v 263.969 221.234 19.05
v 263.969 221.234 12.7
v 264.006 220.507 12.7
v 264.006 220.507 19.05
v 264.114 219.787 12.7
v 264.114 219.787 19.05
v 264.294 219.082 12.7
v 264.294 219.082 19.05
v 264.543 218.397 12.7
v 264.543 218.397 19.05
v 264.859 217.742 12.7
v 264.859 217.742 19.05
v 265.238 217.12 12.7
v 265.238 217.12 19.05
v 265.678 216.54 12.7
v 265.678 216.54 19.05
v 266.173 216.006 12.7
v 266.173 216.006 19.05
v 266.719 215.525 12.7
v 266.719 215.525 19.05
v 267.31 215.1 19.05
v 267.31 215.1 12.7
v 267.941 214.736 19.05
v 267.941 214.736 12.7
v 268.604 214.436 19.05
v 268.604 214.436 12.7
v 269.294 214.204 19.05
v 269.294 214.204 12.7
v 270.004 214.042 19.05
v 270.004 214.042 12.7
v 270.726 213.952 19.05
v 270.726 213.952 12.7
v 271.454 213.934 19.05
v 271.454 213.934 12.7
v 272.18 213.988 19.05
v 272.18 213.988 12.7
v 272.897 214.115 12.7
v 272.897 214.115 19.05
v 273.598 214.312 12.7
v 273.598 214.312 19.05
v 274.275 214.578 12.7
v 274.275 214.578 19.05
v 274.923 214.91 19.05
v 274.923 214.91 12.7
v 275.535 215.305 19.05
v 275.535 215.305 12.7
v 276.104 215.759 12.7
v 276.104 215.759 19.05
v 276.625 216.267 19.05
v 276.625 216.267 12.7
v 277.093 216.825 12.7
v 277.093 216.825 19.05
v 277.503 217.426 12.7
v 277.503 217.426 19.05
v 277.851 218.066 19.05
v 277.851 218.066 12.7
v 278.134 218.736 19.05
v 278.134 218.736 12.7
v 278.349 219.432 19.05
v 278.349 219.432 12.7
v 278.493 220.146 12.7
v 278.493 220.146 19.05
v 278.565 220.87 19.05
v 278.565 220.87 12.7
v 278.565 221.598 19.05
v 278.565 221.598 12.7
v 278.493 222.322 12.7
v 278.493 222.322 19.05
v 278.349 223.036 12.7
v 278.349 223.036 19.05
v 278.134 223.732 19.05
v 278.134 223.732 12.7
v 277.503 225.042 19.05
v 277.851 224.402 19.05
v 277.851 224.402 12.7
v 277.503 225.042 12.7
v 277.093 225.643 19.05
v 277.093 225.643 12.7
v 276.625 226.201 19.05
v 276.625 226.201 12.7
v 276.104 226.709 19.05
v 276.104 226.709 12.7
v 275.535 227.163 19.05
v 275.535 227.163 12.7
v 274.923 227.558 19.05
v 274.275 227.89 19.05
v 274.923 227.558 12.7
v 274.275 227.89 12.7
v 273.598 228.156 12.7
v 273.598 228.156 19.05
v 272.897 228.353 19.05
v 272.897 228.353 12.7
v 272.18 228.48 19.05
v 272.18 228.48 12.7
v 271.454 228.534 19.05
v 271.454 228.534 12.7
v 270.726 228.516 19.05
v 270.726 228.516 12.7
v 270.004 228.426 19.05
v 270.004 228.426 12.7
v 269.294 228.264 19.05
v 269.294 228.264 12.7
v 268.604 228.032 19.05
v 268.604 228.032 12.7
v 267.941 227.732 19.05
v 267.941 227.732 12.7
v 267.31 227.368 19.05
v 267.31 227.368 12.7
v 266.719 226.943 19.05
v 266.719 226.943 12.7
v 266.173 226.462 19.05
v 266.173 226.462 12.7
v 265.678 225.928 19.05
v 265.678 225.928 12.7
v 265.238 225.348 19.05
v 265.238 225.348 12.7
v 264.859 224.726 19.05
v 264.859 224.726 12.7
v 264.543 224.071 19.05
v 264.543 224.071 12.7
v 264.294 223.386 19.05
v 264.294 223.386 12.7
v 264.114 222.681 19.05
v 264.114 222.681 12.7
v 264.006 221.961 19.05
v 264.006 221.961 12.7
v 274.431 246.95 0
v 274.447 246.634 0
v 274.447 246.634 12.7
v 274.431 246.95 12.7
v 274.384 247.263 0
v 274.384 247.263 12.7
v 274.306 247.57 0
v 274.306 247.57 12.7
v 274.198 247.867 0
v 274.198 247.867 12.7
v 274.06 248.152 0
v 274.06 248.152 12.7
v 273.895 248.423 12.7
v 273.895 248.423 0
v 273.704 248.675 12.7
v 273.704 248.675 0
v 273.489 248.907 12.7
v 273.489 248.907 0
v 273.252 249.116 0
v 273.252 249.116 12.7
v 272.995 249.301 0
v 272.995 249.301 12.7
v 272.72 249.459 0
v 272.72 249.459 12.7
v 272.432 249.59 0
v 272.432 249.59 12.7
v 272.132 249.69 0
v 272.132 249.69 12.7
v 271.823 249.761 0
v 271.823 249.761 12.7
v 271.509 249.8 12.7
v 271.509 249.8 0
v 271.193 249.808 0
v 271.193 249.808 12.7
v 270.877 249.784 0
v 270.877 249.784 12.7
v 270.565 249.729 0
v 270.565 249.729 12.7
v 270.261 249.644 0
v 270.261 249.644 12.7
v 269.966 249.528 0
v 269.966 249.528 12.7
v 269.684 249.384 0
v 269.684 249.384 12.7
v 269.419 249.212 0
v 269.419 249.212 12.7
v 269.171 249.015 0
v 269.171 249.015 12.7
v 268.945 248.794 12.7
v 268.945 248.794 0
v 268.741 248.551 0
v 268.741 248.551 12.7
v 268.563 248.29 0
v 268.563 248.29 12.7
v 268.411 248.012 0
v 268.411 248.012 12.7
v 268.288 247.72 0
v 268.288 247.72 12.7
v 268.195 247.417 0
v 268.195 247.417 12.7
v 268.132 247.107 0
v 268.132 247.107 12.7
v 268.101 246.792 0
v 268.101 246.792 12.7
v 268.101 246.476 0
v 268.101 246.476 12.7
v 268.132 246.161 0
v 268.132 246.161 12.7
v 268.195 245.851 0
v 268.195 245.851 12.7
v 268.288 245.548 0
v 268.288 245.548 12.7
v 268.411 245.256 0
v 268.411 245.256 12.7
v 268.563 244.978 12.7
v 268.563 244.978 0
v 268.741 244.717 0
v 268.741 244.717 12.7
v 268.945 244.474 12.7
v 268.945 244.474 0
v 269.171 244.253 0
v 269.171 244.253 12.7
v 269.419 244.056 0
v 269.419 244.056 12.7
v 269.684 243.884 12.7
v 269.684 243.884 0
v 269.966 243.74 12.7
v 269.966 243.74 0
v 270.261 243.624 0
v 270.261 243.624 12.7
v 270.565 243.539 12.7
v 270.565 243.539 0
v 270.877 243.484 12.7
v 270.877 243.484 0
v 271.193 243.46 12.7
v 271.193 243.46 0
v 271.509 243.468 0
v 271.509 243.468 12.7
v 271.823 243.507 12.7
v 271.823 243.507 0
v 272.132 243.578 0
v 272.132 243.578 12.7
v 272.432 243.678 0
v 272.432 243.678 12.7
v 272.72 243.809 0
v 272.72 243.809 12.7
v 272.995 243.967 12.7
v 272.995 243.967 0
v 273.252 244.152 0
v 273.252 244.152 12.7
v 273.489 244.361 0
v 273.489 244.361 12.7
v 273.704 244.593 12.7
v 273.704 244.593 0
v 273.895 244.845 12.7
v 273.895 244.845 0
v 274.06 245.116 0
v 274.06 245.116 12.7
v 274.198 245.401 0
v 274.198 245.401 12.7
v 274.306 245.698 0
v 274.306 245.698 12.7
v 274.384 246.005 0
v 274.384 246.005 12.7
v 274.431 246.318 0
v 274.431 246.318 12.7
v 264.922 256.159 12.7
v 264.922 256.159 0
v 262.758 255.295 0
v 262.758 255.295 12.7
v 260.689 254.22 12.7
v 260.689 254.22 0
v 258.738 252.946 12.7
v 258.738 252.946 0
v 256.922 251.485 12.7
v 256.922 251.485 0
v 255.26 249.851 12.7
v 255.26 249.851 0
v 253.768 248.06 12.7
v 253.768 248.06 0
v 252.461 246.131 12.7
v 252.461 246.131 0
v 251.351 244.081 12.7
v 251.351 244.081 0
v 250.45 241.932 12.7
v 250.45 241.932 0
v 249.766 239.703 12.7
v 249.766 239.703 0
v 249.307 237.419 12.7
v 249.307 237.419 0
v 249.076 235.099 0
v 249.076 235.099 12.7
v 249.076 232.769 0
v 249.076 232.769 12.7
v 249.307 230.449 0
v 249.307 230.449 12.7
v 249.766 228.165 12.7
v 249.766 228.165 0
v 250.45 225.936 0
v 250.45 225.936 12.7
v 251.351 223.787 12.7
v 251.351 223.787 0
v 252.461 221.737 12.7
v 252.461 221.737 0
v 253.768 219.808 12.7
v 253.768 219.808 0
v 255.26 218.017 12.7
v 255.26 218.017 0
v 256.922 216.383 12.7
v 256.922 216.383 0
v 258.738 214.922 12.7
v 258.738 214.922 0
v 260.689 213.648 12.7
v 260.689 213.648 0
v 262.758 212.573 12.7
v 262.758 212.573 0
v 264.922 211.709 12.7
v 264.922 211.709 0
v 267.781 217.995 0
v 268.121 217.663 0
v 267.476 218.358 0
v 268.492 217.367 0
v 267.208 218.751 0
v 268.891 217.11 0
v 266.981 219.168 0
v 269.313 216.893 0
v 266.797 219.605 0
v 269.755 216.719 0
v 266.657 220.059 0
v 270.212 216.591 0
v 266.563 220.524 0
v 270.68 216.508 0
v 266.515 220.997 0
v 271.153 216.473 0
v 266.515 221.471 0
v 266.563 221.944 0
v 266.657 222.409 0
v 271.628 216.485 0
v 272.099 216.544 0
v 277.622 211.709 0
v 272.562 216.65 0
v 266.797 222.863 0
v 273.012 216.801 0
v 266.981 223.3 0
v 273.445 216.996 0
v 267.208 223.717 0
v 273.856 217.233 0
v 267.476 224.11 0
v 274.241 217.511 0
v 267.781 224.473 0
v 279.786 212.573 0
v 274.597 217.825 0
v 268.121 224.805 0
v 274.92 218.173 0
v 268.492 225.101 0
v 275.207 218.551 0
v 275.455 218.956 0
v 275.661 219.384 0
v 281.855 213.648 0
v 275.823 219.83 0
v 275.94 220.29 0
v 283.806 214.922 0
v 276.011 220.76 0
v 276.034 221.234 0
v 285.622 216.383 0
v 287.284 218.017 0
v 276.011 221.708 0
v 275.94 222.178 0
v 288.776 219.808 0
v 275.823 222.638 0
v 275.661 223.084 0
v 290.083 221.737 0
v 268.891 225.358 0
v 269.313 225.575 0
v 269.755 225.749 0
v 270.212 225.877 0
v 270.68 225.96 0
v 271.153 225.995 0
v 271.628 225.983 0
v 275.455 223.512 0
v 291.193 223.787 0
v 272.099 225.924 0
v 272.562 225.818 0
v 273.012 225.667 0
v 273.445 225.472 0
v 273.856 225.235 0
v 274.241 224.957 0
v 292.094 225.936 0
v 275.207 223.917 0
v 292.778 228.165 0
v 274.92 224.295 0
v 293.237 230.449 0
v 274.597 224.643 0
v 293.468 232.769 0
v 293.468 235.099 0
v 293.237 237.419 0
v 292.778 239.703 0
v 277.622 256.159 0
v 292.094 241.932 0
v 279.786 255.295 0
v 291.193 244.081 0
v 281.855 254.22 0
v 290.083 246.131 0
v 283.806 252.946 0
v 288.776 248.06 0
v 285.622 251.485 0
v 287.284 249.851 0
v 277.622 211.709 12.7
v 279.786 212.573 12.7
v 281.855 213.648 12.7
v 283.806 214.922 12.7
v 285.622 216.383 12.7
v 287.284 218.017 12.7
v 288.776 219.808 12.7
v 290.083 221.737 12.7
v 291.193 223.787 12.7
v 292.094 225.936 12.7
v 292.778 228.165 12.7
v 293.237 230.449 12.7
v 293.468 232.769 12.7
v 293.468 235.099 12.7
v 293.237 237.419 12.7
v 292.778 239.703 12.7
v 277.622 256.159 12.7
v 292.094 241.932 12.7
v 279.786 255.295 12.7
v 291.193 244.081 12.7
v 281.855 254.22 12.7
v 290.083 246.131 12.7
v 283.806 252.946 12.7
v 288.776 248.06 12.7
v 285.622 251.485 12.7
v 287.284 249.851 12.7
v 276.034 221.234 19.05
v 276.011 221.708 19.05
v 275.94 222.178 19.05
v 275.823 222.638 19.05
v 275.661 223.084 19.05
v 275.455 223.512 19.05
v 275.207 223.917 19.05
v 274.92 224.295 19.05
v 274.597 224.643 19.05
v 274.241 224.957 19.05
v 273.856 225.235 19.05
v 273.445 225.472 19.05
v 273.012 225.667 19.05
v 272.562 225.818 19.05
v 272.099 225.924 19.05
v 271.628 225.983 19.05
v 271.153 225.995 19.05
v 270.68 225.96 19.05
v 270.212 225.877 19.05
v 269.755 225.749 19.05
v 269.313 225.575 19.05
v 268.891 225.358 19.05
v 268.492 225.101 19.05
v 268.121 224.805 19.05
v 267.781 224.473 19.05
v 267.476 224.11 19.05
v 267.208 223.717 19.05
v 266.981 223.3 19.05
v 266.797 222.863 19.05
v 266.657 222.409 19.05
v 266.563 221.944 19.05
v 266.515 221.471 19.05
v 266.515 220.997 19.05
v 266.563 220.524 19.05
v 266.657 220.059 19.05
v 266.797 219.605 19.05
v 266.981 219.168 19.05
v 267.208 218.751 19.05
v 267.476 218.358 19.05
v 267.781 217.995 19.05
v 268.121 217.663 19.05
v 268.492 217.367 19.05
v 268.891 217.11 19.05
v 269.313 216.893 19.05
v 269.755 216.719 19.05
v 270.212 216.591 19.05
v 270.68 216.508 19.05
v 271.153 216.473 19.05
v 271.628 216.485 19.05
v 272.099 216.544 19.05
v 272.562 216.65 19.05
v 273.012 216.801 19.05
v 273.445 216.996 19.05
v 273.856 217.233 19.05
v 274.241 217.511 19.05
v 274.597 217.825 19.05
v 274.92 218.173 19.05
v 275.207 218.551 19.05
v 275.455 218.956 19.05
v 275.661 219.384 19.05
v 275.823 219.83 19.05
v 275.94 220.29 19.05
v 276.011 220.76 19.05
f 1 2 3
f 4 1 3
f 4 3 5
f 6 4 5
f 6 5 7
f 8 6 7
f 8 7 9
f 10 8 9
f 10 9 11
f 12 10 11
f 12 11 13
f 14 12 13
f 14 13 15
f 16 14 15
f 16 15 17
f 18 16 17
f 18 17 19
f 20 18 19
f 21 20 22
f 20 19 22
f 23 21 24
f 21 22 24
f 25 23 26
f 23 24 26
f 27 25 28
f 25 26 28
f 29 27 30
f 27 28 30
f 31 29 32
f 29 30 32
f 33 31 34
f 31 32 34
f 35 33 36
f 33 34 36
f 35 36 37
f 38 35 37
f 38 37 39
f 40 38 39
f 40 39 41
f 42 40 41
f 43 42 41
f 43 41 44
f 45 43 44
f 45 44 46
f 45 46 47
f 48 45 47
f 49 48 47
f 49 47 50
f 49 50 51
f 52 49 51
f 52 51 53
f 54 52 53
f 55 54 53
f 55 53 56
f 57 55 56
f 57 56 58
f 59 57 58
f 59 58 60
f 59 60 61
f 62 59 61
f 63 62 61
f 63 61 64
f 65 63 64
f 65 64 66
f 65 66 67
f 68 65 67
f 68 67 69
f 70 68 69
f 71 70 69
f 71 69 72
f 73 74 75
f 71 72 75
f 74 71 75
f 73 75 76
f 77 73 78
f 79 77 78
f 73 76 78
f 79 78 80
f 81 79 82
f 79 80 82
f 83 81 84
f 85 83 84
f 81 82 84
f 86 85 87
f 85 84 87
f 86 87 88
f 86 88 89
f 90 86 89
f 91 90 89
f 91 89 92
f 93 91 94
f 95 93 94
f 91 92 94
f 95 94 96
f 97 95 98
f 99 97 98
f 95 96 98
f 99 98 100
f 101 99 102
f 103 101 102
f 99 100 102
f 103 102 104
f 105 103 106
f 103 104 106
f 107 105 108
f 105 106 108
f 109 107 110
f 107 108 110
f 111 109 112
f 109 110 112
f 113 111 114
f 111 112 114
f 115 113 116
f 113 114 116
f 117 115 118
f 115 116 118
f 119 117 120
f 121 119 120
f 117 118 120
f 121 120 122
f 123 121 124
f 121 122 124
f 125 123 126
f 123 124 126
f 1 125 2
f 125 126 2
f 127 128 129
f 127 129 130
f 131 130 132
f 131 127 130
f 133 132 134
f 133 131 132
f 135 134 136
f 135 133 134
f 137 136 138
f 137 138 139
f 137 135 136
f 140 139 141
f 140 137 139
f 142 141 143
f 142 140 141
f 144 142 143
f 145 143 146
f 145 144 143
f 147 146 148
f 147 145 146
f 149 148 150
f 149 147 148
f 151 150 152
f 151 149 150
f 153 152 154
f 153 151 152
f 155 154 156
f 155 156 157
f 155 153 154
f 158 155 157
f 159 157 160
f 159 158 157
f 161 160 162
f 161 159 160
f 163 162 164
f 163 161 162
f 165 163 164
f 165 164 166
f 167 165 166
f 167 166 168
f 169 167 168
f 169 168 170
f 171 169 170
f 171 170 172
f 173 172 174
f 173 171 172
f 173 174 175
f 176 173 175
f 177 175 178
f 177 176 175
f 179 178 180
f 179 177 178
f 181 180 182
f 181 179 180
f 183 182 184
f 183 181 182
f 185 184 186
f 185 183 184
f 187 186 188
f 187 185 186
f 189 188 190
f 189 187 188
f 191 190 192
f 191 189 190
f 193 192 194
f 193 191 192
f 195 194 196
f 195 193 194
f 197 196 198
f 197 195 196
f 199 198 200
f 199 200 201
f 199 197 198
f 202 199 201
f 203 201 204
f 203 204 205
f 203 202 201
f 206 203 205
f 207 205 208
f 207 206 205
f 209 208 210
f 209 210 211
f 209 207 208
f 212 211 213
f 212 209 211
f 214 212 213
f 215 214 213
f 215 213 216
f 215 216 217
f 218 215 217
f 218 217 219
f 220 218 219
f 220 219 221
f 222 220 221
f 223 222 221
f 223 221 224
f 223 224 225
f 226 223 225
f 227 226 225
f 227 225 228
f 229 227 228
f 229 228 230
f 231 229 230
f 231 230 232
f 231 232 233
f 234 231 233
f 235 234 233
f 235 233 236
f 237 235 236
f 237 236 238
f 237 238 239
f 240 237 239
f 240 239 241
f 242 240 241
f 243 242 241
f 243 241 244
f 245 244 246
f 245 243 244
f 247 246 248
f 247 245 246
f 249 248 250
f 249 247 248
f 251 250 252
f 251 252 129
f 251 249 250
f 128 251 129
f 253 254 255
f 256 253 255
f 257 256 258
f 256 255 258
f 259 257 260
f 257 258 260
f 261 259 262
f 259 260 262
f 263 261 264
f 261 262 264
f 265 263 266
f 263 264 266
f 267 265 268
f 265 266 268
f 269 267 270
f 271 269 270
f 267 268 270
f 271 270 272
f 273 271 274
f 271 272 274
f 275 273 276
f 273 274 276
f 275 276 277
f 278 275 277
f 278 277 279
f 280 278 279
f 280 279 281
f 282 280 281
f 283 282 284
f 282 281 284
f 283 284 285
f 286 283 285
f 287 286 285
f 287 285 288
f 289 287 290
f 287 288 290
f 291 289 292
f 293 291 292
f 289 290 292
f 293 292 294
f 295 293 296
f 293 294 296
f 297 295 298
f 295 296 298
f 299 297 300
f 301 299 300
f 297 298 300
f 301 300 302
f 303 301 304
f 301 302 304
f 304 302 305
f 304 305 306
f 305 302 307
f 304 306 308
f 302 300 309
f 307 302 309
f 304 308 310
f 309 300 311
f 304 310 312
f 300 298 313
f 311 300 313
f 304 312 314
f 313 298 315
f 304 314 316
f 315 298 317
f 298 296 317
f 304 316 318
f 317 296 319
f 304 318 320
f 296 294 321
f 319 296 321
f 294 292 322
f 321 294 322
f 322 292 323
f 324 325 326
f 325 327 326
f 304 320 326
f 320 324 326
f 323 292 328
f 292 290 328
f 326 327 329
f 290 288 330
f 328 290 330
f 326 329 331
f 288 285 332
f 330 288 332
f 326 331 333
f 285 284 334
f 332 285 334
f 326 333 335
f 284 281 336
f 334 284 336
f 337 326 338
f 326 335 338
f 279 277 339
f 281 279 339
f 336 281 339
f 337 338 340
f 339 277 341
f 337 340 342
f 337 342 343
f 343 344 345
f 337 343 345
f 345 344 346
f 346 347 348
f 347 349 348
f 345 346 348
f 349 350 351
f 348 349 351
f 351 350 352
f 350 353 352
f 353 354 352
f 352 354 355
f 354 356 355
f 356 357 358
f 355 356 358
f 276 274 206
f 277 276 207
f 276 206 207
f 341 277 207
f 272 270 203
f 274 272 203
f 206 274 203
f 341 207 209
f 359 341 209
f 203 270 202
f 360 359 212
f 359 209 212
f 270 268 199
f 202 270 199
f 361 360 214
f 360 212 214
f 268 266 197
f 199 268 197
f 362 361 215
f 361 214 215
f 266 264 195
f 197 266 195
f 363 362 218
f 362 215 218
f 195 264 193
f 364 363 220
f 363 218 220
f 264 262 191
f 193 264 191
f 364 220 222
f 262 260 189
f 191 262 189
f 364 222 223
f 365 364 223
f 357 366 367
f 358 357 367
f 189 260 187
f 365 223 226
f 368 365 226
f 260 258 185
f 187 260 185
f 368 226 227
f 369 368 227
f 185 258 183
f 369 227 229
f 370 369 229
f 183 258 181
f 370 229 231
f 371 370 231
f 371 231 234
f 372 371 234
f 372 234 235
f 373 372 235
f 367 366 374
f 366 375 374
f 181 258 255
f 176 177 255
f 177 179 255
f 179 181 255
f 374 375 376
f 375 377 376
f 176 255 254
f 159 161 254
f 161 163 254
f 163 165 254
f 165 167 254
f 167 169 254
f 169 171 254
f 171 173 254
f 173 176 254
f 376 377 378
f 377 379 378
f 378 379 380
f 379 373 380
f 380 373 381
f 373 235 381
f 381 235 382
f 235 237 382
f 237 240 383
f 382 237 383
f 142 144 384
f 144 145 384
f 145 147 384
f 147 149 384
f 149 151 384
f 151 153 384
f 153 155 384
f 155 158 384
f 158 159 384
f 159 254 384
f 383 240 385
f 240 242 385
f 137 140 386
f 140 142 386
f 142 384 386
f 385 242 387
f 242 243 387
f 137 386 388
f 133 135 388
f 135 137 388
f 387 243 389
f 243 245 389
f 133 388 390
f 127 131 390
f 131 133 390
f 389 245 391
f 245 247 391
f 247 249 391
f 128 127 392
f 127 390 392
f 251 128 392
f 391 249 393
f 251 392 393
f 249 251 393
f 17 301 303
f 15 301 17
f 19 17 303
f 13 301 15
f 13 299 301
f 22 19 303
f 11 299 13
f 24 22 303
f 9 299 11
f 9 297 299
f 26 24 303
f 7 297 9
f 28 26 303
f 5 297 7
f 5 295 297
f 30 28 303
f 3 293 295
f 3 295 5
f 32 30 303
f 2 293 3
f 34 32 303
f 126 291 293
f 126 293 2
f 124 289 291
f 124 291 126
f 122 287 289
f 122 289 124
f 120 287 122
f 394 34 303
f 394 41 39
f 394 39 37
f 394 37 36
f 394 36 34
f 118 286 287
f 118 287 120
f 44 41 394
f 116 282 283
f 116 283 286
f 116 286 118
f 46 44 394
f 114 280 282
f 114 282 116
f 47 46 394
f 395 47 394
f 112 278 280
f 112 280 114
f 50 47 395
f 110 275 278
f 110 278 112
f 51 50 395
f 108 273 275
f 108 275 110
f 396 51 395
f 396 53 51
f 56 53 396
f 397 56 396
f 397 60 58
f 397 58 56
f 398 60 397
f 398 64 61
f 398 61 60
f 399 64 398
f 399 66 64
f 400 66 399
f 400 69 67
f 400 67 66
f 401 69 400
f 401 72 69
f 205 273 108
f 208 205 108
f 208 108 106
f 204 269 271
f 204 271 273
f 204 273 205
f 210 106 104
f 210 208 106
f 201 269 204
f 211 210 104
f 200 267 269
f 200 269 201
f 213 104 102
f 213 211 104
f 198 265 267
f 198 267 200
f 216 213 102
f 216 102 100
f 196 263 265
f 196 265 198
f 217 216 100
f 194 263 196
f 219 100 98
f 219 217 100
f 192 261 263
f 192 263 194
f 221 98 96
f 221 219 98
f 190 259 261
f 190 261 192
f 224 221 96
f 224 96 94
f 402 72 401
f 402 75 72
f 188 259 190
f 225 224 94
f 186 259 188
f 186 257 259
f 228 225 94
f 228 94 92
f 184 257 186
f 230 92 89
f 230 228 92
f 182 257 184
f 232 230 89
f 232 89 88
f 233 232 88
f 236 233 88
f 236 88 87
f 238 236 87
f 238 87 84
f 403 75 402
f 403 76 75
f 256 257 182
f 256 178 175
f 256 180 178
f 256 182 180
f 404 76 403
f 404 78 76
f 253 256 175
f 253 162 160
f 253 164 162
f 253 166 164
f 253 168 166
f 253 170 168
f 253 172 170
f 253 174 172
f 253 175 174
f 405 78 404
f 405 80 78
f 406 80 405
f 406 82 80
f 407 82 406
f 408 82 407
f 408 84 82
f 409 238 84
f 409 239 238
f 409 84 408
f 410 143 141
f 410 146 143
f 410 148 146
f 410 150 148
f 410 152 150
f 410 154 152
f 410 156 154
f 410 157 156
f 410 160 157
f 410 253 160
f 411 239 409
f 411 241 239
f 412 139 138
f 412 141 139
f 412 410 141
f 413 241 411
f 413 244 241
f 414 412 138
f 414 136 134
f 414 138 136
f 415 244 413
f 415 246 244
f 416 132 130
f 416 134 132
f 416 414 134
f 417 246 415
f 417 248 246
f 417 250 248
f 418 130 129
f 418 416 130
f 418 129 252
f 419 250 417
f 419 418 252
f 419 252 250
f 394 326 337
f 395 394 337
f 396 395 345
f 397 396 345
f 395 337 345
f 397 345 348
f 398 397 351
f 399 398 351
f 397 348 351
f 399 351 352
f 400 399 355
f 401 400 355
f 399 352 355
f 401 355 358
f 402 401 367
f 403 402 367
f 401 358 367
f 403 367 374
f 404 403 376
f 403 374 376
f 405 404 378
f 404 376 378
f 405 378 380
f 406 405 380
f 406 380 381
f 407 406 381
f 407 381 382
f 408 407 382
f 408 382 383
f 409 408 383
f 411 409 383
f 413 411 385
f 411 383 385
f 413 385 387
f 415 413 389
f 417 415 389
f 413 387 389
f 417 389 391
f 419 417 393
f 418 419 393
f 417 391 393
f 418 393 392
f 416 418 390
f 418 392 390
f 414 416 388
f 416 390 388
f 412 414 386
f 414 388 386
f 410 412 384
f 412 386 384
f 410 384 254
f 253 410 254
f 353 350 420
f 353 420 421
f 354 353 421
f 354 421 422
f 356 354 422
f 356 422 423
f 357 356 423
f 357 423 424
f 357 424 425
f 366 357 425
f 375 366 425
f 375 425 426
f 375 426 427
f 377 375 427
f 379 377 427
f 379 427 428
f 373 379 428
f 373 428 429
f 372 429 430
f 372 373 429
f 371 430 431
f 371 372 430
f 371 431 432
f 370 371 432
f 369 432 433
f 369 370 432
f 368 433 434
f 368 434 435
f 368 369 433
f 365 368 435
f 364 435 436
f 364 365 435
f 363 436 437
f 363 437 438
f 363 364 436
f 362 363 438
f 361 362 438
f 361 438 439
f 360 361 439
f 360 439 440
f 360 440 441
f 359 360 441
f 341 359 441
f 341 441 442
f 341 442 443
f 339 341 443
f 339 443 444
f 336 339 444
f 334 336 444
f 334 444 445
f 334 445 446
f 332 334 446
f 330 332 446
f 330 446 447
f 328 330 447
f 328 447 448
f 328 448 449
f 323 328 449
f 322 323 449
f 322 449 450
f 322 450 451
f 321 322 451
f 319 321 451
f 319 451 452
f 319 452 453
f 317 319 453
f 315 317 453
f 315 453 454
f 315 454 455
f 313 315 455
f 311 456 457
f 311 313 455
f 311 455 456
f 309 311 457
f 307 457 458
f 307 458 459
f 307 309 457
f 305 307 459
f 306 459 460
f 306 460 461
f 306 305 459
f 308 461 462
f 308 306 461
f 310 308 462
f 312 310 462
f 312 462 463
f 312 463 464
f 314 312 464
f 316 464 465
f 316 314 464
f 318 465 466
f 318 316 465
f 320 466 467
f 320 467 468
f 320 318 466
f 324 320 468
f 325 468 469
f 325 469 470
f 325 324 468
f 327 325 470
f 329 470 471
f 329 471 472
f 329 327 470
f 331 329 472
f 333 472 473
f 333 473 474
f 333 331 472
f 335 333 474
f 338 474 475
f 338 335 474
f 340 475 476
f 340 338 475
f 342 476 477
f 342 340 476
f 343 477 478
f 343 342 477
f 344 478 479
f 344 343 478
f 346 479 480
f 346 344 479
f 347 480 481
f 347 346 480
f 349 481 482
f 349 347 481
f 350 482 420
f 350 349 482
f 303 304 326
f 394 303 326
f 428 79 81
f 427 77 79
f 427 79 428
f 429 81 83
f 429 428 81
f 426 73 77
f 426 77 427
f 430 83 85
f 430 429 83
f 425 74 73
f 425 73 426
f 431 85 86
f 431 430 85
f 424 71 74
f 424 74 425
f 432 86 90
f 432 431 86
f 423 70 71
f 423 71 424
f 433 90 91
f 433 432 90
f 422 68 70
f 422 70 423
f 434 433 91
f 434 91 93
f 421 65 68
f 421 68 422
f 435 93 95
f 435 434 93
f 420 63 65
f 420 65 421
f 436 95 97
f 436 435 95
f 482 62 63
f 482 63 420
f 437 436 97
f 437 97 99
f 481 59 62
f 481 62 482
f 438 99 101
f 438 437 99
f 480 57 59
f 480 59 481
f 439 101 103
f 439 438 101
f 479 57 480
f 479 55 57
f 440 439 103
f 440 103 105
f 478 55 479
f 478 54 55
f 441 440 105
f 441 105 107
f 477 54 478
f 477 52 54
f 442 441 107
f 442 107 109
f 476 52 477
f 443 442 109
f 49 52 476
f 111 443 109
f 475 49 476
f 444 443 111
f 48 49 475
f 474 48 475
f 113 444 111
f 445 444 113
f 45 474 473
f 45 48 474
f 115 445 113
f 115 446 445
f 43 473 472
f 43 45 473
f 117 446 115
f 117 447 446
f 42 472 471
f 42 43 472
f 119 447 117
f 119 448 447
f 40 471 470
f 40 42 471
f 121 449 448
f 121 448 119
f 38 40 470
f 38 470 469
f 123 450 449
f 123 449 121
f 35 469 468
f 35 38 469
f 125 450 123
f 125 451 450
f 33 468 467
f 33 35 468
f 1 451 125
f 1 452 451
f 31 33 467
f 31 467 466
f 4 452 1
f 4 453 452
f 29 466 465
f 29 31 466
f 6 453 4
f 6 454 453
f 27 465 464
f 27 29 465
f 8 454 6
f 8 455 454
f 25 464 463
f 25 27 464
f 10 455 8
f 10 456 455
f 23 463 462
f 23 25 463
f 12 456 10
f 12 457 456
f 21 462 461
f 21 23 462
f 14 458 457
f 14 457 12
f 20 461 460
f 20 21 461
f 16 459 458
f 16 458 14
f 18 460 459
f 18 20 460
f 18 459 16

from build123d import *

# Parameters (mm, degrees)
MODEL_R             = 3.175
MODEL_R_2           = 4.7625
BOSS_EXTRUDE1_DEPTH = 12.7
MODEL_3_R           = 7.3025
MODEL_3_R_2         = 4.7625
BOSS_EXTRUDE2_DEPTH = 19.05


with BuildPart() as part:
    # Model → Boss-Extrude1 (new body)
    with BuildSketch(Plane.XY):
        with BuildLine():
            Line((264.921999997, 211.709), (277.621999997, 211.709))
            ThreePointArc((277.621999997, 211.709), (293.497000017, 233.934), (277.621999997, 256.159))
            Line((277.621999997, 256.159), (264.921999997, 256.159))
            ThreePointArc((264.921999997, 256.159), (249.046999977, 233.934), (264.921999997, 211.709))
        make_face()
        with Locations((271.271999997, 246.634)):
            Circle(MODEL_R, mode=Mode.SUBTRACT)
        with Locations((271.271999997, 221.234)):
            Circle(MODEL_R_2, mode=Mode.SUBTRACT)
    extrude(amount=BOSS_EXTRUDE1_DEPTH)

    # Model<3> → Boss-Extrude2 (add)
    with BuildSketch(Plane.XY):
        with Locations((271.271999997, 221.234)):
            Circle(MODEL_3_R)
        with Locations((271.271999997, 221.234)):
            Circle(MODEL_3_R_2, mode=Mode.SUBTRACT)
    extrude(amount=BOSS_EXTRUDE2_DEPTH)


solid = part.part
